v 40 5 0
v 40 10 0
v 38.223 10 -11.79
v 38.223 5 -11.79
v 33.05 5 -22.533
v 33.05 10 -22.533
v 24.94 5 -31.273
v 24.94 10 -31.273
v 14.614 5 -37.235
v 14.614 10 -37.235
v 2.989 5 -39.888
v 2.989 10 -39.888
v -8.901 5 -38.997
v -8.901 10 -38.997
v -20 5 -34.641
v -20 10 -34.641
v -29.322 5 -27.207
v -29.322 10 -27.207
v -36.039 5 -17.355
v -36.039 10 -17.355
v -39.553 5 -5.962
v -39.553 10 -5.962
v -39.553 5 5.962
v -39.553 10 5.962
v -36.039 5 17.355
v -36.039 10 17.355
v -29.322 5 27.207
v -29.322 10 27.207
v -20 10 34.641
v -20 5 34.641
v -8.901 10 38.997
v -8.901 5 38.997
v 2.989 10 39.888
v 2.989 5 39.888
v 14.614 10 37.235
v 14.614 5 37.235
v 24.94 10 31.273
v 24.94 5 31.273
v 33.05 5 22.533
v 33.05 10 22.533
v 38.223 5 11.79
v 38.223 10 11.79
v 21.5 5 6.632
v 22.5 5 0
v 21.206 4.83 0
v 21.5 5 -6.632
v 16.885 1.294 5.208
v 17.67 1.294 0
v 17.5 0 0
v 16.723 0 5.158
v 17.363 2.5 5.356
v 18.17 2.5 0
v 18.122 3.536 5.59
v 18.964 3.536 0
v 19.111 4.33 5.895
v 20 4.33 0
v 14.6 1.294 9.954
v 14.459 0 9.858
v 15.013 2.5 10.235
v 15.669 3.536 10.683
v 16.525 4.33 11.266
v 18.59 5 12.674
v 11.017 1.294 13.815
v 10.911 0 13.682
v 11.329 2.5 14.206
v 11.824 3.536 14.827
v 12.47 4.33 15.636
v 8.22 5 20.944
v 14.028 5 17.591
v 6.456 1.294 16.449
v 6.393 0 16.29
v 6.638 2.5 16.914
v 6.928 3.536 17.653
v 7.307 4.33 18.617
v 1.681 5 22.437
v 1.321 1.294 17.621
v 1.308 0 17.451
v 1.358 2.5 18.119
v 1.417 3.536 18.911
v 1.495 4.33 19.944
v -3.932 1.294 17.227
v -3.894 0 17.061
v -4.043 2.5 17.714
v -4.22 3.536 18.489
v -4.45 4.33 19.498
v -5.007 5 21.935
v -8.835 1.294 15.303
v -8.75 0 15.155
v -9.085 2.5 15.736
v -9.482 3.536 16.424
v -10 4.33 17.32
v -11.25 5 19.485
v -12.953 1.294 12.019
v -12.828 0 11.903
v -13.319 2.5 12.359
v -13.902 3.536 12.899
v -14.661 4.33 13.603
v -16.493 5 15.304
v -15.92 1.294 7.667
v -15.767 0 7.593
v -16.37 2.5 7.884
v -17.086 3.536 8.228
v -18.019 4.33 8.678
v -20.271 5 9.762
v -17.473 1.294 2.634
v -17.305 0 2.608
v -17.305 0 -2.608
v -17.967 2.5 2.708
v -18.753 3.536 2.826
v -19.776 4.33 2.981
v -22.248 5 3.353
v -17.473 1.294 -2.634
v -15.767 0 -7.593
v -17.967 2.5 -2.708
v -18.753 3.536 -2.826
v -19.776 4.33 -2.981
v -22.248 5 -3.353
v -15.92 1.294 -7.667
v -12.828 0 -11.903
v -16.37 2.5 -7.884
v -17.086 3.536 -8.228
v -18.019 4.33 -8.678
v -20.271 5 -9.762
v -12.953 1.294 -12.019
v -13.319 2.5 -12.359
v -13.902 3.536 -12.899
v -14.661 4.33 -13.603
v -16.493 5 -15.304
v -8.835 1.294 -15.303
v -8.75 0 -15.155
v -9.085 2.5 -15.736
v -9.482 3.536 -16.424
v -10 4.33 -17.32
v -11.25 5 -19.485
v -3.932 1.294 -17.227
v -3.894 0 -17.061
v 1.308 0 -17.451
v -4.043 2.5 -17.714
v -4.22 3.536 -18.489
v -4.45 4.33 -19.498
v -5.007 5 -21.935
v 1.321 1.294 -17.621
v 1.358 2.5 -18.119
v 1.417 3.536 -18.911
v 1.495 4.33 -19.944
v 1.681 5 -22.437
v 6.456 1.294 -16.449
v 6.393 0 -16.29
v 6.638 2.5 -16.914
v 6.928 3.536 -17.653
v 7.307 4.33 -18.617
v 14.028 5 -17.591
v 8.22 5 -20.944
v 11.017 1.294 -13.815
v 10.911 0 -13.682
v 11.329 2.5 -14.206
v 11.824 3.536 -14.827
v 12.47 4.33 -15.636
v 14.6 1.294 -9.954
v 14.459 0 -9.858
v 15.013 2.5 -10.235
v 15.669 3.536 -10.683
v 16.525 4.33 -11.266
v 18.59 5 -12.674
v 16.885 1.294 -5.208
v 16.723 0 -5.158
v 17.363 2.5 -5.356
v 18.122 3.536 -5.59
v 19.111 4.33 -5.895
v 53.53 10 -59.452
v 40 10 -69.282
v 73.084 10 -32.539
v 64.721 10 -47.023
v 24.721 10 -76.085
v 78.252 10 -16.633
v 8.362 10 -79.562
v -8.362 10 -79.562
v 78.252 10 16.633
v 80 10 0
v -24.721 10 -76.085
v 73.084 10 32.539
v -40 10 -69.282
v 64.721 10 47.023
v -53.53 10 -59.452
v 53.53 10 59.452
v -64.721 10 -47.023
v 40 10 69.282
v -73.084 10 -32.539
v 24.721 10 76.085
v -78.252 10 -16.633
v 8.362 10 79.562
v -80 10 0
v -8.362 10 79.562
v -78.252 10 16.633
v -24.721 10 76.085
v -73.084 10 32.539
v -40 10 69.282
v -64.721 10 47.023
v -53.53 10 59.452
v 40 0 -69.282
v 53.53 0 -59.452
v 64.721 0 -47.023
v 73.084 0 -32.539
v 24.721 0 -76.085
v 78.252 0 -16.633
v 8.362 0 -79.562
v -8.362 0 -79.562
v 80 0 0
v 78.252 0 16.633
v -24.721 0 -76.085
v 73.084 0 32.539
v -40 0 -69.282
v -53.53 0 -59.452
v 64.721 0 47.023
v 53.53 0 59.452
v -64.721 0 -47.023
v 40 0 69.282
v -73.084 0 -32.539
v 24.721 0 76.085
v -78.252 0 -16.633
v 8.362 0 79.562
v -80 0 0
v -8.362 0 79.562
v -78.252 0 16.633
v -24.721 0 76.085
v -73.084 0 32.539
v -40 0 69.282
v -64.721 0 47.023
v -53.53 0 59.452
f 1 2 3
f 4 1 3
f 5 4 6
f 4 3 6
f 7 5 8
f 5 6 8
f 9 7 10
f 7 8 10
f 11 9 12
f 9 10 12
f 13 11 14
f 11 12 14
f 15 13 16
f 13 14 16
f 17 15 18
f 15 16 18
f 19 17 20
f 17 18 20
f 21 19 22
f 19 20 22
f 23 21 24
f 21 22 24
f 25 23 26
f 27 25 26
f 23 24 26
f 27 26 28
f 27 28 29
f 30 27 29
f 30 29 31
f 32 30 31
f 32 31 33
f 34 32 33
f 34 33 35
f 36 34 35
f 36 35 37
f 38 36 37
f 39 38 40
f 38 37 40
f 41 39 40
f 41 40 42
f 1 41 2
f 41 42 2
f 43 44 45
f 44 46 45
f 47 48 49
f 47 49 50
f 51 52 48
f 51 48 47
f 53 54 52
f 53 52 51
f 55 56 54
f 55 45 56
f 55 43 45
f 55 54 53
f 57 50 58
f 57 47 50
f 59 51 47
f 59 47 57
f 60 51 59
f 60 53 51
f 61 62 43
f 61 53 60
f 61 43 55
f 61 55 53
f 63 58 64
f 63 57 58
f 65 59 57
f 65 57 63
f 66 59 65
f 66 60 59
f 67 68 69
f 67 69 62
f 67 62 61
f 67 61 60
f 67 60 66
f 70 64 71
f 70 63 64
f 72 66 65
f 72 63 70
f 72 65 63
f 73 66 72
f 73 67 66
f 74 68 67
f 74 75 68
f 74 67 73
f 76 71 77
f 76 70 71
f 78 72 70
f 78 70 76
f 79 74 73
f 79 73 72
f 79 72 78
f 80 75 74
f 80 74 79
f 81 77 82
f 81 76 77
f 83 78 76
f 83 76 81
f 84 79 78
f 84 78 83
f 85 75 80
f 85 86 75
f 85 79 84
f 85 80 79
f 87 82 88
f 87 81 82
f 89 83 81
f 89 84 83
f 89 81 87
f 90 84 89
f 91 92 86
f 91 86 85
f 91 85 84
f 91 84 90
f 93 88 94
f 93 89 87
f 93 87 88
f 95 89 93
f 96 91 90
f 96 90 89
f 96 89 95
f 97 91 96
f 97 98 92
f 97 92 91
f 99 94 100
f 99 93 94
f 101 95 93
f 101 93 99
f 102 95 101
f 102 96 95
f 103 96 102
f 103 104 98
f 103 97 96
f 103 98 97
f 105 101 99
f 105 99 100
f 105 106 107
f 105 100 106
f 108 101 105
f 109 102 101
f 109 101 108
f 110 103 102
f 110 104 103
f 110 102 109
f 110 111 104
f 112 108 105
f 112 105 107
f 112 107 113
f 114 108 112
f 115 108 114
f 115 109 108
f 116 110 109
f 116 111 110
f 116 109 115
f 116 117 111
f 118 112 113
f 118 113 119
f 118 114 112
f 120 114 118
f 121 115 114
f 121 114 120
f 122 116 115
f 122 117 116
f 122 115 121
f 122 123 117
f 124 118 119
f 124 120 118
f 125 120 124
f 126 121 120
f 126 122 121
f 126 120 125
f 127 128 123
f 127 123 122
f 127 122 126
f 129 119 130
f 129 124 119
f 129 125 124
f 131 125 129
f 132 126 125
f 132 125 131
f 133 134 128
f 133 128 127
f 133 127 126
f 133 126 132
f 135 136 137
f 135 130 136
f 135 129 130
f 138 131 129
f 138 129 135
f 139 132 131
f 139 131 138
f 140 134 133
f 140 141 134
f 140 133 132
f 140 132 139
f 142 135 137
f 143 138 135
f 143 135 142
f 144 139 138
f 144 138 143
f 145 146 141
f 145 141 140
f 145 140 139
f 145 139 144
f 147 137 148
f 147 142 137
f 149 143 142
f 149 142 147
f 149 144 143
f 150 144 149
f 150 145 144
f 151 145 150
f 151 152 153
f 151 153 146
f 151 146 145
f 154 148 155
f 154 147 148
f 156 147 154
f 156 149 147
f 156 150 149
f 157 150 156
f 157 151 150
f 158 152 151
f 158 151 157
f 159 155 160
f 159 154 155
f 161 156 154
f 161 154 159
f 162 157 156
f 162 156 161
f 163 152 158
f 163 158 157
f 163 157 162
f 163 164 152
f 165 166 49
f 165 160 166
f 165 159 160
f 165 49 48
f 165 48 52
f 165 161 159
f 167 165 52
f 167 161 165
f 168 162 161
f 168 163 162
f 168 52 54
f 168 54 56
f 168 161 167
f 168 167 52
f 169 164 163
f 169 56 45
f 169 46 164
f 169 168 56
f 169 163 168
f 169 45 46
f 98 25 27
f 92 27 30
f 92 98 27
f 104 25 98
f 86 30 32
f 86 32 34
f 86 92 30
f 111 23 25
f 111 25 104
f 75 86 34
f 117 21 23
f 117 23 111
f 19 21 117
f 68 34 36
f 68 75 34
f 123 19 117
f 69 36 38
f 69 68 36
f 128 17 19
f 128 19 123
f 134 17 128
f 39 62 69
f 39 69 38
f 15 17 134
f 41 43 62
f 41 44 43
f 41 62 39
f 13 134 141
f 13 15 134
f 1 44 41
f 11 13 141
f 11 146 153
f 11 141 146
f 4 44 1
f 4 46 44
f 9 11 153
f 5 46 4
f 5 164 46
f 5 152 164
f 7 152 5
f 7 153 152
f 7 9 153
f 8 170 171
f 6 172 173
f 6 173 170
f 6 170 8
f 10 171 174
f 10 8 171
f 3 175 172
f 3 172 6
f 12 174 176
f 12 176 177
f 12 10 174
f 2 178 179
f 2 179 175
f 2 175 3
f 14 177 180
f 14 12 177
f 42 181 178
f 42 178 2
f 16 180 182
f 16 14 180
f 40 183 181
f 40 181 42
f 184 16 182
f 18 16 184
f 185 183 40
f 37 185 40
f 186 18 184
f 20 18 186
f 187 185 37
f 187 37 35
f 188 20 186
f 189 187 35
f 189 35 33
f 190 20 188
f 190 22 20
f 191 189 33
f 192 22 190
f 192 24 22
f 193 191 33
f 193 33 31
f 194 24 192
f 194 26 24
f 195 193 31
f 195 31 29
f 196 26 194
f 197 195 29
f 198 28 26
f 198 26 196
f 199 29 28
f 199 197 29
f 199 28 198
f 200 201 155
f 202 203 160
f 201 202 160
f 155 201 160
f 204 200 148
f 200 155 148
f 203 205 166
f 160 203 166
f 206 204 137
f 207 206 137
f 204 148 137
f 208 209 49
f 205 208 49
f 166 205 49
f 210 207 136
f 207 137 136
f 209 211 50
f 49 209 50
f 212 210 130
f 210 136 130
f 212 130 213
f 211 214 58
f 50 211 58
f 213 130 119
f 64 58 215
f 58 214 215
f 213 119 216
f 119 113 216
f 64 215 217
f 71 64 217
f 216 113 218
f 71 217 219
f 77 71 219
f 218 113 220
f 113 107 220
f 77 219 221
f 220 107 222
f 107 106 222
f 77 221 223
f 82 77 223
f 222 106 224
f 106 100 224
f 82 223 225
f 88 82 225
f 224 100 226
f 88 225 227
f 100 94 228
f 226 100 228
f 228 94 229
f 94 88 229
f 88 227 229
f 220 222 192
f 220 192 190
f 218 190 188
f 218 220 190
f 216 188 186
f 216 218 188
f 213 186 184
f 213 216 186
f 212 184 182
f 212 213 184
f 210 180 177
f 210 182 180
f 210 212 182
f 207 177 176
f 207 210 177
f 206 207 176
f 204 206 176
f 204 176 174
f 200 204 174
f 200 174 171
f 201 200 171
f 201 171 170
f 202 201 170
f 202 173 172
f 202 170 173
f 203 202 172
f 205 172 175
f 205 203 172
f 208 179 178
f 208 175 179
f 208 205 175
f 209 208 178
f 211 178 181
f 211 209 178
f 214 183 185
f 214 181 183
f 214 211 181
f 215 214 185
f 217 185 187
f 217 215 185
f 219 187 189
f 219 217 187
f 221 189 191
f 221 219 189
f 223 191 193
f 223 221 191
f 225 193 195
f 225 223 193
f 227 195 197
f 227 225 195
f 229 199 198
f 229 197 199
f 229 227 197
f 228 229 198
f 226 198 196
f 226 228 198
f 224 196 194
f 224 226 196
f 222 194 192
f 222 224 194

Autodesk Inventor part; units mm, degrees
ref_plane "YZ Plane" through (0, 0, 0) normal (1, 0, 0) x (0, 1, 0)
ref_plane "XZ Plane" through (0, 0, 0) normal (0, 1, 0) x (-1, 0, 0)
ref_plane "XY Plane" through (0, 0, 0) normal (0, 0, 1) x (1, 0, 0)
sketch "Sketch1" plane through (0, 0, 0) normal (0, 1, 0) x (-1, 0, 0)
  circle A0 centre (0, 0) radius 80
  dimension "d0" = 160
extrude "Extrusion1" add sketch "Sketch1" along normal blind 10
sketch "Sketch2" plane through (0, 10, 0) normal (0, 1, 0) x (1, 0, 0)
  circle A0 centre (0, 0) radius 17.5
  dimension "d5" = 35
extrude "Extrusion2" cut sketch "Sketch2" against normal blind 10
sketch "Sketch3" plane through (0, 10, 0) normal (0, 1, 0) x (1, 0, 0)
  circle A0 centre (0, 0) radius 40
  dimension "d8" = 80
extrude "Extrusion3" cut sketch "Sketch3" against normal blind 5
fillet "Fillet2" radius 5 1 edges at (-17.5, 5, 0)
properties part number "faceplate" material "Stainless Steel"
